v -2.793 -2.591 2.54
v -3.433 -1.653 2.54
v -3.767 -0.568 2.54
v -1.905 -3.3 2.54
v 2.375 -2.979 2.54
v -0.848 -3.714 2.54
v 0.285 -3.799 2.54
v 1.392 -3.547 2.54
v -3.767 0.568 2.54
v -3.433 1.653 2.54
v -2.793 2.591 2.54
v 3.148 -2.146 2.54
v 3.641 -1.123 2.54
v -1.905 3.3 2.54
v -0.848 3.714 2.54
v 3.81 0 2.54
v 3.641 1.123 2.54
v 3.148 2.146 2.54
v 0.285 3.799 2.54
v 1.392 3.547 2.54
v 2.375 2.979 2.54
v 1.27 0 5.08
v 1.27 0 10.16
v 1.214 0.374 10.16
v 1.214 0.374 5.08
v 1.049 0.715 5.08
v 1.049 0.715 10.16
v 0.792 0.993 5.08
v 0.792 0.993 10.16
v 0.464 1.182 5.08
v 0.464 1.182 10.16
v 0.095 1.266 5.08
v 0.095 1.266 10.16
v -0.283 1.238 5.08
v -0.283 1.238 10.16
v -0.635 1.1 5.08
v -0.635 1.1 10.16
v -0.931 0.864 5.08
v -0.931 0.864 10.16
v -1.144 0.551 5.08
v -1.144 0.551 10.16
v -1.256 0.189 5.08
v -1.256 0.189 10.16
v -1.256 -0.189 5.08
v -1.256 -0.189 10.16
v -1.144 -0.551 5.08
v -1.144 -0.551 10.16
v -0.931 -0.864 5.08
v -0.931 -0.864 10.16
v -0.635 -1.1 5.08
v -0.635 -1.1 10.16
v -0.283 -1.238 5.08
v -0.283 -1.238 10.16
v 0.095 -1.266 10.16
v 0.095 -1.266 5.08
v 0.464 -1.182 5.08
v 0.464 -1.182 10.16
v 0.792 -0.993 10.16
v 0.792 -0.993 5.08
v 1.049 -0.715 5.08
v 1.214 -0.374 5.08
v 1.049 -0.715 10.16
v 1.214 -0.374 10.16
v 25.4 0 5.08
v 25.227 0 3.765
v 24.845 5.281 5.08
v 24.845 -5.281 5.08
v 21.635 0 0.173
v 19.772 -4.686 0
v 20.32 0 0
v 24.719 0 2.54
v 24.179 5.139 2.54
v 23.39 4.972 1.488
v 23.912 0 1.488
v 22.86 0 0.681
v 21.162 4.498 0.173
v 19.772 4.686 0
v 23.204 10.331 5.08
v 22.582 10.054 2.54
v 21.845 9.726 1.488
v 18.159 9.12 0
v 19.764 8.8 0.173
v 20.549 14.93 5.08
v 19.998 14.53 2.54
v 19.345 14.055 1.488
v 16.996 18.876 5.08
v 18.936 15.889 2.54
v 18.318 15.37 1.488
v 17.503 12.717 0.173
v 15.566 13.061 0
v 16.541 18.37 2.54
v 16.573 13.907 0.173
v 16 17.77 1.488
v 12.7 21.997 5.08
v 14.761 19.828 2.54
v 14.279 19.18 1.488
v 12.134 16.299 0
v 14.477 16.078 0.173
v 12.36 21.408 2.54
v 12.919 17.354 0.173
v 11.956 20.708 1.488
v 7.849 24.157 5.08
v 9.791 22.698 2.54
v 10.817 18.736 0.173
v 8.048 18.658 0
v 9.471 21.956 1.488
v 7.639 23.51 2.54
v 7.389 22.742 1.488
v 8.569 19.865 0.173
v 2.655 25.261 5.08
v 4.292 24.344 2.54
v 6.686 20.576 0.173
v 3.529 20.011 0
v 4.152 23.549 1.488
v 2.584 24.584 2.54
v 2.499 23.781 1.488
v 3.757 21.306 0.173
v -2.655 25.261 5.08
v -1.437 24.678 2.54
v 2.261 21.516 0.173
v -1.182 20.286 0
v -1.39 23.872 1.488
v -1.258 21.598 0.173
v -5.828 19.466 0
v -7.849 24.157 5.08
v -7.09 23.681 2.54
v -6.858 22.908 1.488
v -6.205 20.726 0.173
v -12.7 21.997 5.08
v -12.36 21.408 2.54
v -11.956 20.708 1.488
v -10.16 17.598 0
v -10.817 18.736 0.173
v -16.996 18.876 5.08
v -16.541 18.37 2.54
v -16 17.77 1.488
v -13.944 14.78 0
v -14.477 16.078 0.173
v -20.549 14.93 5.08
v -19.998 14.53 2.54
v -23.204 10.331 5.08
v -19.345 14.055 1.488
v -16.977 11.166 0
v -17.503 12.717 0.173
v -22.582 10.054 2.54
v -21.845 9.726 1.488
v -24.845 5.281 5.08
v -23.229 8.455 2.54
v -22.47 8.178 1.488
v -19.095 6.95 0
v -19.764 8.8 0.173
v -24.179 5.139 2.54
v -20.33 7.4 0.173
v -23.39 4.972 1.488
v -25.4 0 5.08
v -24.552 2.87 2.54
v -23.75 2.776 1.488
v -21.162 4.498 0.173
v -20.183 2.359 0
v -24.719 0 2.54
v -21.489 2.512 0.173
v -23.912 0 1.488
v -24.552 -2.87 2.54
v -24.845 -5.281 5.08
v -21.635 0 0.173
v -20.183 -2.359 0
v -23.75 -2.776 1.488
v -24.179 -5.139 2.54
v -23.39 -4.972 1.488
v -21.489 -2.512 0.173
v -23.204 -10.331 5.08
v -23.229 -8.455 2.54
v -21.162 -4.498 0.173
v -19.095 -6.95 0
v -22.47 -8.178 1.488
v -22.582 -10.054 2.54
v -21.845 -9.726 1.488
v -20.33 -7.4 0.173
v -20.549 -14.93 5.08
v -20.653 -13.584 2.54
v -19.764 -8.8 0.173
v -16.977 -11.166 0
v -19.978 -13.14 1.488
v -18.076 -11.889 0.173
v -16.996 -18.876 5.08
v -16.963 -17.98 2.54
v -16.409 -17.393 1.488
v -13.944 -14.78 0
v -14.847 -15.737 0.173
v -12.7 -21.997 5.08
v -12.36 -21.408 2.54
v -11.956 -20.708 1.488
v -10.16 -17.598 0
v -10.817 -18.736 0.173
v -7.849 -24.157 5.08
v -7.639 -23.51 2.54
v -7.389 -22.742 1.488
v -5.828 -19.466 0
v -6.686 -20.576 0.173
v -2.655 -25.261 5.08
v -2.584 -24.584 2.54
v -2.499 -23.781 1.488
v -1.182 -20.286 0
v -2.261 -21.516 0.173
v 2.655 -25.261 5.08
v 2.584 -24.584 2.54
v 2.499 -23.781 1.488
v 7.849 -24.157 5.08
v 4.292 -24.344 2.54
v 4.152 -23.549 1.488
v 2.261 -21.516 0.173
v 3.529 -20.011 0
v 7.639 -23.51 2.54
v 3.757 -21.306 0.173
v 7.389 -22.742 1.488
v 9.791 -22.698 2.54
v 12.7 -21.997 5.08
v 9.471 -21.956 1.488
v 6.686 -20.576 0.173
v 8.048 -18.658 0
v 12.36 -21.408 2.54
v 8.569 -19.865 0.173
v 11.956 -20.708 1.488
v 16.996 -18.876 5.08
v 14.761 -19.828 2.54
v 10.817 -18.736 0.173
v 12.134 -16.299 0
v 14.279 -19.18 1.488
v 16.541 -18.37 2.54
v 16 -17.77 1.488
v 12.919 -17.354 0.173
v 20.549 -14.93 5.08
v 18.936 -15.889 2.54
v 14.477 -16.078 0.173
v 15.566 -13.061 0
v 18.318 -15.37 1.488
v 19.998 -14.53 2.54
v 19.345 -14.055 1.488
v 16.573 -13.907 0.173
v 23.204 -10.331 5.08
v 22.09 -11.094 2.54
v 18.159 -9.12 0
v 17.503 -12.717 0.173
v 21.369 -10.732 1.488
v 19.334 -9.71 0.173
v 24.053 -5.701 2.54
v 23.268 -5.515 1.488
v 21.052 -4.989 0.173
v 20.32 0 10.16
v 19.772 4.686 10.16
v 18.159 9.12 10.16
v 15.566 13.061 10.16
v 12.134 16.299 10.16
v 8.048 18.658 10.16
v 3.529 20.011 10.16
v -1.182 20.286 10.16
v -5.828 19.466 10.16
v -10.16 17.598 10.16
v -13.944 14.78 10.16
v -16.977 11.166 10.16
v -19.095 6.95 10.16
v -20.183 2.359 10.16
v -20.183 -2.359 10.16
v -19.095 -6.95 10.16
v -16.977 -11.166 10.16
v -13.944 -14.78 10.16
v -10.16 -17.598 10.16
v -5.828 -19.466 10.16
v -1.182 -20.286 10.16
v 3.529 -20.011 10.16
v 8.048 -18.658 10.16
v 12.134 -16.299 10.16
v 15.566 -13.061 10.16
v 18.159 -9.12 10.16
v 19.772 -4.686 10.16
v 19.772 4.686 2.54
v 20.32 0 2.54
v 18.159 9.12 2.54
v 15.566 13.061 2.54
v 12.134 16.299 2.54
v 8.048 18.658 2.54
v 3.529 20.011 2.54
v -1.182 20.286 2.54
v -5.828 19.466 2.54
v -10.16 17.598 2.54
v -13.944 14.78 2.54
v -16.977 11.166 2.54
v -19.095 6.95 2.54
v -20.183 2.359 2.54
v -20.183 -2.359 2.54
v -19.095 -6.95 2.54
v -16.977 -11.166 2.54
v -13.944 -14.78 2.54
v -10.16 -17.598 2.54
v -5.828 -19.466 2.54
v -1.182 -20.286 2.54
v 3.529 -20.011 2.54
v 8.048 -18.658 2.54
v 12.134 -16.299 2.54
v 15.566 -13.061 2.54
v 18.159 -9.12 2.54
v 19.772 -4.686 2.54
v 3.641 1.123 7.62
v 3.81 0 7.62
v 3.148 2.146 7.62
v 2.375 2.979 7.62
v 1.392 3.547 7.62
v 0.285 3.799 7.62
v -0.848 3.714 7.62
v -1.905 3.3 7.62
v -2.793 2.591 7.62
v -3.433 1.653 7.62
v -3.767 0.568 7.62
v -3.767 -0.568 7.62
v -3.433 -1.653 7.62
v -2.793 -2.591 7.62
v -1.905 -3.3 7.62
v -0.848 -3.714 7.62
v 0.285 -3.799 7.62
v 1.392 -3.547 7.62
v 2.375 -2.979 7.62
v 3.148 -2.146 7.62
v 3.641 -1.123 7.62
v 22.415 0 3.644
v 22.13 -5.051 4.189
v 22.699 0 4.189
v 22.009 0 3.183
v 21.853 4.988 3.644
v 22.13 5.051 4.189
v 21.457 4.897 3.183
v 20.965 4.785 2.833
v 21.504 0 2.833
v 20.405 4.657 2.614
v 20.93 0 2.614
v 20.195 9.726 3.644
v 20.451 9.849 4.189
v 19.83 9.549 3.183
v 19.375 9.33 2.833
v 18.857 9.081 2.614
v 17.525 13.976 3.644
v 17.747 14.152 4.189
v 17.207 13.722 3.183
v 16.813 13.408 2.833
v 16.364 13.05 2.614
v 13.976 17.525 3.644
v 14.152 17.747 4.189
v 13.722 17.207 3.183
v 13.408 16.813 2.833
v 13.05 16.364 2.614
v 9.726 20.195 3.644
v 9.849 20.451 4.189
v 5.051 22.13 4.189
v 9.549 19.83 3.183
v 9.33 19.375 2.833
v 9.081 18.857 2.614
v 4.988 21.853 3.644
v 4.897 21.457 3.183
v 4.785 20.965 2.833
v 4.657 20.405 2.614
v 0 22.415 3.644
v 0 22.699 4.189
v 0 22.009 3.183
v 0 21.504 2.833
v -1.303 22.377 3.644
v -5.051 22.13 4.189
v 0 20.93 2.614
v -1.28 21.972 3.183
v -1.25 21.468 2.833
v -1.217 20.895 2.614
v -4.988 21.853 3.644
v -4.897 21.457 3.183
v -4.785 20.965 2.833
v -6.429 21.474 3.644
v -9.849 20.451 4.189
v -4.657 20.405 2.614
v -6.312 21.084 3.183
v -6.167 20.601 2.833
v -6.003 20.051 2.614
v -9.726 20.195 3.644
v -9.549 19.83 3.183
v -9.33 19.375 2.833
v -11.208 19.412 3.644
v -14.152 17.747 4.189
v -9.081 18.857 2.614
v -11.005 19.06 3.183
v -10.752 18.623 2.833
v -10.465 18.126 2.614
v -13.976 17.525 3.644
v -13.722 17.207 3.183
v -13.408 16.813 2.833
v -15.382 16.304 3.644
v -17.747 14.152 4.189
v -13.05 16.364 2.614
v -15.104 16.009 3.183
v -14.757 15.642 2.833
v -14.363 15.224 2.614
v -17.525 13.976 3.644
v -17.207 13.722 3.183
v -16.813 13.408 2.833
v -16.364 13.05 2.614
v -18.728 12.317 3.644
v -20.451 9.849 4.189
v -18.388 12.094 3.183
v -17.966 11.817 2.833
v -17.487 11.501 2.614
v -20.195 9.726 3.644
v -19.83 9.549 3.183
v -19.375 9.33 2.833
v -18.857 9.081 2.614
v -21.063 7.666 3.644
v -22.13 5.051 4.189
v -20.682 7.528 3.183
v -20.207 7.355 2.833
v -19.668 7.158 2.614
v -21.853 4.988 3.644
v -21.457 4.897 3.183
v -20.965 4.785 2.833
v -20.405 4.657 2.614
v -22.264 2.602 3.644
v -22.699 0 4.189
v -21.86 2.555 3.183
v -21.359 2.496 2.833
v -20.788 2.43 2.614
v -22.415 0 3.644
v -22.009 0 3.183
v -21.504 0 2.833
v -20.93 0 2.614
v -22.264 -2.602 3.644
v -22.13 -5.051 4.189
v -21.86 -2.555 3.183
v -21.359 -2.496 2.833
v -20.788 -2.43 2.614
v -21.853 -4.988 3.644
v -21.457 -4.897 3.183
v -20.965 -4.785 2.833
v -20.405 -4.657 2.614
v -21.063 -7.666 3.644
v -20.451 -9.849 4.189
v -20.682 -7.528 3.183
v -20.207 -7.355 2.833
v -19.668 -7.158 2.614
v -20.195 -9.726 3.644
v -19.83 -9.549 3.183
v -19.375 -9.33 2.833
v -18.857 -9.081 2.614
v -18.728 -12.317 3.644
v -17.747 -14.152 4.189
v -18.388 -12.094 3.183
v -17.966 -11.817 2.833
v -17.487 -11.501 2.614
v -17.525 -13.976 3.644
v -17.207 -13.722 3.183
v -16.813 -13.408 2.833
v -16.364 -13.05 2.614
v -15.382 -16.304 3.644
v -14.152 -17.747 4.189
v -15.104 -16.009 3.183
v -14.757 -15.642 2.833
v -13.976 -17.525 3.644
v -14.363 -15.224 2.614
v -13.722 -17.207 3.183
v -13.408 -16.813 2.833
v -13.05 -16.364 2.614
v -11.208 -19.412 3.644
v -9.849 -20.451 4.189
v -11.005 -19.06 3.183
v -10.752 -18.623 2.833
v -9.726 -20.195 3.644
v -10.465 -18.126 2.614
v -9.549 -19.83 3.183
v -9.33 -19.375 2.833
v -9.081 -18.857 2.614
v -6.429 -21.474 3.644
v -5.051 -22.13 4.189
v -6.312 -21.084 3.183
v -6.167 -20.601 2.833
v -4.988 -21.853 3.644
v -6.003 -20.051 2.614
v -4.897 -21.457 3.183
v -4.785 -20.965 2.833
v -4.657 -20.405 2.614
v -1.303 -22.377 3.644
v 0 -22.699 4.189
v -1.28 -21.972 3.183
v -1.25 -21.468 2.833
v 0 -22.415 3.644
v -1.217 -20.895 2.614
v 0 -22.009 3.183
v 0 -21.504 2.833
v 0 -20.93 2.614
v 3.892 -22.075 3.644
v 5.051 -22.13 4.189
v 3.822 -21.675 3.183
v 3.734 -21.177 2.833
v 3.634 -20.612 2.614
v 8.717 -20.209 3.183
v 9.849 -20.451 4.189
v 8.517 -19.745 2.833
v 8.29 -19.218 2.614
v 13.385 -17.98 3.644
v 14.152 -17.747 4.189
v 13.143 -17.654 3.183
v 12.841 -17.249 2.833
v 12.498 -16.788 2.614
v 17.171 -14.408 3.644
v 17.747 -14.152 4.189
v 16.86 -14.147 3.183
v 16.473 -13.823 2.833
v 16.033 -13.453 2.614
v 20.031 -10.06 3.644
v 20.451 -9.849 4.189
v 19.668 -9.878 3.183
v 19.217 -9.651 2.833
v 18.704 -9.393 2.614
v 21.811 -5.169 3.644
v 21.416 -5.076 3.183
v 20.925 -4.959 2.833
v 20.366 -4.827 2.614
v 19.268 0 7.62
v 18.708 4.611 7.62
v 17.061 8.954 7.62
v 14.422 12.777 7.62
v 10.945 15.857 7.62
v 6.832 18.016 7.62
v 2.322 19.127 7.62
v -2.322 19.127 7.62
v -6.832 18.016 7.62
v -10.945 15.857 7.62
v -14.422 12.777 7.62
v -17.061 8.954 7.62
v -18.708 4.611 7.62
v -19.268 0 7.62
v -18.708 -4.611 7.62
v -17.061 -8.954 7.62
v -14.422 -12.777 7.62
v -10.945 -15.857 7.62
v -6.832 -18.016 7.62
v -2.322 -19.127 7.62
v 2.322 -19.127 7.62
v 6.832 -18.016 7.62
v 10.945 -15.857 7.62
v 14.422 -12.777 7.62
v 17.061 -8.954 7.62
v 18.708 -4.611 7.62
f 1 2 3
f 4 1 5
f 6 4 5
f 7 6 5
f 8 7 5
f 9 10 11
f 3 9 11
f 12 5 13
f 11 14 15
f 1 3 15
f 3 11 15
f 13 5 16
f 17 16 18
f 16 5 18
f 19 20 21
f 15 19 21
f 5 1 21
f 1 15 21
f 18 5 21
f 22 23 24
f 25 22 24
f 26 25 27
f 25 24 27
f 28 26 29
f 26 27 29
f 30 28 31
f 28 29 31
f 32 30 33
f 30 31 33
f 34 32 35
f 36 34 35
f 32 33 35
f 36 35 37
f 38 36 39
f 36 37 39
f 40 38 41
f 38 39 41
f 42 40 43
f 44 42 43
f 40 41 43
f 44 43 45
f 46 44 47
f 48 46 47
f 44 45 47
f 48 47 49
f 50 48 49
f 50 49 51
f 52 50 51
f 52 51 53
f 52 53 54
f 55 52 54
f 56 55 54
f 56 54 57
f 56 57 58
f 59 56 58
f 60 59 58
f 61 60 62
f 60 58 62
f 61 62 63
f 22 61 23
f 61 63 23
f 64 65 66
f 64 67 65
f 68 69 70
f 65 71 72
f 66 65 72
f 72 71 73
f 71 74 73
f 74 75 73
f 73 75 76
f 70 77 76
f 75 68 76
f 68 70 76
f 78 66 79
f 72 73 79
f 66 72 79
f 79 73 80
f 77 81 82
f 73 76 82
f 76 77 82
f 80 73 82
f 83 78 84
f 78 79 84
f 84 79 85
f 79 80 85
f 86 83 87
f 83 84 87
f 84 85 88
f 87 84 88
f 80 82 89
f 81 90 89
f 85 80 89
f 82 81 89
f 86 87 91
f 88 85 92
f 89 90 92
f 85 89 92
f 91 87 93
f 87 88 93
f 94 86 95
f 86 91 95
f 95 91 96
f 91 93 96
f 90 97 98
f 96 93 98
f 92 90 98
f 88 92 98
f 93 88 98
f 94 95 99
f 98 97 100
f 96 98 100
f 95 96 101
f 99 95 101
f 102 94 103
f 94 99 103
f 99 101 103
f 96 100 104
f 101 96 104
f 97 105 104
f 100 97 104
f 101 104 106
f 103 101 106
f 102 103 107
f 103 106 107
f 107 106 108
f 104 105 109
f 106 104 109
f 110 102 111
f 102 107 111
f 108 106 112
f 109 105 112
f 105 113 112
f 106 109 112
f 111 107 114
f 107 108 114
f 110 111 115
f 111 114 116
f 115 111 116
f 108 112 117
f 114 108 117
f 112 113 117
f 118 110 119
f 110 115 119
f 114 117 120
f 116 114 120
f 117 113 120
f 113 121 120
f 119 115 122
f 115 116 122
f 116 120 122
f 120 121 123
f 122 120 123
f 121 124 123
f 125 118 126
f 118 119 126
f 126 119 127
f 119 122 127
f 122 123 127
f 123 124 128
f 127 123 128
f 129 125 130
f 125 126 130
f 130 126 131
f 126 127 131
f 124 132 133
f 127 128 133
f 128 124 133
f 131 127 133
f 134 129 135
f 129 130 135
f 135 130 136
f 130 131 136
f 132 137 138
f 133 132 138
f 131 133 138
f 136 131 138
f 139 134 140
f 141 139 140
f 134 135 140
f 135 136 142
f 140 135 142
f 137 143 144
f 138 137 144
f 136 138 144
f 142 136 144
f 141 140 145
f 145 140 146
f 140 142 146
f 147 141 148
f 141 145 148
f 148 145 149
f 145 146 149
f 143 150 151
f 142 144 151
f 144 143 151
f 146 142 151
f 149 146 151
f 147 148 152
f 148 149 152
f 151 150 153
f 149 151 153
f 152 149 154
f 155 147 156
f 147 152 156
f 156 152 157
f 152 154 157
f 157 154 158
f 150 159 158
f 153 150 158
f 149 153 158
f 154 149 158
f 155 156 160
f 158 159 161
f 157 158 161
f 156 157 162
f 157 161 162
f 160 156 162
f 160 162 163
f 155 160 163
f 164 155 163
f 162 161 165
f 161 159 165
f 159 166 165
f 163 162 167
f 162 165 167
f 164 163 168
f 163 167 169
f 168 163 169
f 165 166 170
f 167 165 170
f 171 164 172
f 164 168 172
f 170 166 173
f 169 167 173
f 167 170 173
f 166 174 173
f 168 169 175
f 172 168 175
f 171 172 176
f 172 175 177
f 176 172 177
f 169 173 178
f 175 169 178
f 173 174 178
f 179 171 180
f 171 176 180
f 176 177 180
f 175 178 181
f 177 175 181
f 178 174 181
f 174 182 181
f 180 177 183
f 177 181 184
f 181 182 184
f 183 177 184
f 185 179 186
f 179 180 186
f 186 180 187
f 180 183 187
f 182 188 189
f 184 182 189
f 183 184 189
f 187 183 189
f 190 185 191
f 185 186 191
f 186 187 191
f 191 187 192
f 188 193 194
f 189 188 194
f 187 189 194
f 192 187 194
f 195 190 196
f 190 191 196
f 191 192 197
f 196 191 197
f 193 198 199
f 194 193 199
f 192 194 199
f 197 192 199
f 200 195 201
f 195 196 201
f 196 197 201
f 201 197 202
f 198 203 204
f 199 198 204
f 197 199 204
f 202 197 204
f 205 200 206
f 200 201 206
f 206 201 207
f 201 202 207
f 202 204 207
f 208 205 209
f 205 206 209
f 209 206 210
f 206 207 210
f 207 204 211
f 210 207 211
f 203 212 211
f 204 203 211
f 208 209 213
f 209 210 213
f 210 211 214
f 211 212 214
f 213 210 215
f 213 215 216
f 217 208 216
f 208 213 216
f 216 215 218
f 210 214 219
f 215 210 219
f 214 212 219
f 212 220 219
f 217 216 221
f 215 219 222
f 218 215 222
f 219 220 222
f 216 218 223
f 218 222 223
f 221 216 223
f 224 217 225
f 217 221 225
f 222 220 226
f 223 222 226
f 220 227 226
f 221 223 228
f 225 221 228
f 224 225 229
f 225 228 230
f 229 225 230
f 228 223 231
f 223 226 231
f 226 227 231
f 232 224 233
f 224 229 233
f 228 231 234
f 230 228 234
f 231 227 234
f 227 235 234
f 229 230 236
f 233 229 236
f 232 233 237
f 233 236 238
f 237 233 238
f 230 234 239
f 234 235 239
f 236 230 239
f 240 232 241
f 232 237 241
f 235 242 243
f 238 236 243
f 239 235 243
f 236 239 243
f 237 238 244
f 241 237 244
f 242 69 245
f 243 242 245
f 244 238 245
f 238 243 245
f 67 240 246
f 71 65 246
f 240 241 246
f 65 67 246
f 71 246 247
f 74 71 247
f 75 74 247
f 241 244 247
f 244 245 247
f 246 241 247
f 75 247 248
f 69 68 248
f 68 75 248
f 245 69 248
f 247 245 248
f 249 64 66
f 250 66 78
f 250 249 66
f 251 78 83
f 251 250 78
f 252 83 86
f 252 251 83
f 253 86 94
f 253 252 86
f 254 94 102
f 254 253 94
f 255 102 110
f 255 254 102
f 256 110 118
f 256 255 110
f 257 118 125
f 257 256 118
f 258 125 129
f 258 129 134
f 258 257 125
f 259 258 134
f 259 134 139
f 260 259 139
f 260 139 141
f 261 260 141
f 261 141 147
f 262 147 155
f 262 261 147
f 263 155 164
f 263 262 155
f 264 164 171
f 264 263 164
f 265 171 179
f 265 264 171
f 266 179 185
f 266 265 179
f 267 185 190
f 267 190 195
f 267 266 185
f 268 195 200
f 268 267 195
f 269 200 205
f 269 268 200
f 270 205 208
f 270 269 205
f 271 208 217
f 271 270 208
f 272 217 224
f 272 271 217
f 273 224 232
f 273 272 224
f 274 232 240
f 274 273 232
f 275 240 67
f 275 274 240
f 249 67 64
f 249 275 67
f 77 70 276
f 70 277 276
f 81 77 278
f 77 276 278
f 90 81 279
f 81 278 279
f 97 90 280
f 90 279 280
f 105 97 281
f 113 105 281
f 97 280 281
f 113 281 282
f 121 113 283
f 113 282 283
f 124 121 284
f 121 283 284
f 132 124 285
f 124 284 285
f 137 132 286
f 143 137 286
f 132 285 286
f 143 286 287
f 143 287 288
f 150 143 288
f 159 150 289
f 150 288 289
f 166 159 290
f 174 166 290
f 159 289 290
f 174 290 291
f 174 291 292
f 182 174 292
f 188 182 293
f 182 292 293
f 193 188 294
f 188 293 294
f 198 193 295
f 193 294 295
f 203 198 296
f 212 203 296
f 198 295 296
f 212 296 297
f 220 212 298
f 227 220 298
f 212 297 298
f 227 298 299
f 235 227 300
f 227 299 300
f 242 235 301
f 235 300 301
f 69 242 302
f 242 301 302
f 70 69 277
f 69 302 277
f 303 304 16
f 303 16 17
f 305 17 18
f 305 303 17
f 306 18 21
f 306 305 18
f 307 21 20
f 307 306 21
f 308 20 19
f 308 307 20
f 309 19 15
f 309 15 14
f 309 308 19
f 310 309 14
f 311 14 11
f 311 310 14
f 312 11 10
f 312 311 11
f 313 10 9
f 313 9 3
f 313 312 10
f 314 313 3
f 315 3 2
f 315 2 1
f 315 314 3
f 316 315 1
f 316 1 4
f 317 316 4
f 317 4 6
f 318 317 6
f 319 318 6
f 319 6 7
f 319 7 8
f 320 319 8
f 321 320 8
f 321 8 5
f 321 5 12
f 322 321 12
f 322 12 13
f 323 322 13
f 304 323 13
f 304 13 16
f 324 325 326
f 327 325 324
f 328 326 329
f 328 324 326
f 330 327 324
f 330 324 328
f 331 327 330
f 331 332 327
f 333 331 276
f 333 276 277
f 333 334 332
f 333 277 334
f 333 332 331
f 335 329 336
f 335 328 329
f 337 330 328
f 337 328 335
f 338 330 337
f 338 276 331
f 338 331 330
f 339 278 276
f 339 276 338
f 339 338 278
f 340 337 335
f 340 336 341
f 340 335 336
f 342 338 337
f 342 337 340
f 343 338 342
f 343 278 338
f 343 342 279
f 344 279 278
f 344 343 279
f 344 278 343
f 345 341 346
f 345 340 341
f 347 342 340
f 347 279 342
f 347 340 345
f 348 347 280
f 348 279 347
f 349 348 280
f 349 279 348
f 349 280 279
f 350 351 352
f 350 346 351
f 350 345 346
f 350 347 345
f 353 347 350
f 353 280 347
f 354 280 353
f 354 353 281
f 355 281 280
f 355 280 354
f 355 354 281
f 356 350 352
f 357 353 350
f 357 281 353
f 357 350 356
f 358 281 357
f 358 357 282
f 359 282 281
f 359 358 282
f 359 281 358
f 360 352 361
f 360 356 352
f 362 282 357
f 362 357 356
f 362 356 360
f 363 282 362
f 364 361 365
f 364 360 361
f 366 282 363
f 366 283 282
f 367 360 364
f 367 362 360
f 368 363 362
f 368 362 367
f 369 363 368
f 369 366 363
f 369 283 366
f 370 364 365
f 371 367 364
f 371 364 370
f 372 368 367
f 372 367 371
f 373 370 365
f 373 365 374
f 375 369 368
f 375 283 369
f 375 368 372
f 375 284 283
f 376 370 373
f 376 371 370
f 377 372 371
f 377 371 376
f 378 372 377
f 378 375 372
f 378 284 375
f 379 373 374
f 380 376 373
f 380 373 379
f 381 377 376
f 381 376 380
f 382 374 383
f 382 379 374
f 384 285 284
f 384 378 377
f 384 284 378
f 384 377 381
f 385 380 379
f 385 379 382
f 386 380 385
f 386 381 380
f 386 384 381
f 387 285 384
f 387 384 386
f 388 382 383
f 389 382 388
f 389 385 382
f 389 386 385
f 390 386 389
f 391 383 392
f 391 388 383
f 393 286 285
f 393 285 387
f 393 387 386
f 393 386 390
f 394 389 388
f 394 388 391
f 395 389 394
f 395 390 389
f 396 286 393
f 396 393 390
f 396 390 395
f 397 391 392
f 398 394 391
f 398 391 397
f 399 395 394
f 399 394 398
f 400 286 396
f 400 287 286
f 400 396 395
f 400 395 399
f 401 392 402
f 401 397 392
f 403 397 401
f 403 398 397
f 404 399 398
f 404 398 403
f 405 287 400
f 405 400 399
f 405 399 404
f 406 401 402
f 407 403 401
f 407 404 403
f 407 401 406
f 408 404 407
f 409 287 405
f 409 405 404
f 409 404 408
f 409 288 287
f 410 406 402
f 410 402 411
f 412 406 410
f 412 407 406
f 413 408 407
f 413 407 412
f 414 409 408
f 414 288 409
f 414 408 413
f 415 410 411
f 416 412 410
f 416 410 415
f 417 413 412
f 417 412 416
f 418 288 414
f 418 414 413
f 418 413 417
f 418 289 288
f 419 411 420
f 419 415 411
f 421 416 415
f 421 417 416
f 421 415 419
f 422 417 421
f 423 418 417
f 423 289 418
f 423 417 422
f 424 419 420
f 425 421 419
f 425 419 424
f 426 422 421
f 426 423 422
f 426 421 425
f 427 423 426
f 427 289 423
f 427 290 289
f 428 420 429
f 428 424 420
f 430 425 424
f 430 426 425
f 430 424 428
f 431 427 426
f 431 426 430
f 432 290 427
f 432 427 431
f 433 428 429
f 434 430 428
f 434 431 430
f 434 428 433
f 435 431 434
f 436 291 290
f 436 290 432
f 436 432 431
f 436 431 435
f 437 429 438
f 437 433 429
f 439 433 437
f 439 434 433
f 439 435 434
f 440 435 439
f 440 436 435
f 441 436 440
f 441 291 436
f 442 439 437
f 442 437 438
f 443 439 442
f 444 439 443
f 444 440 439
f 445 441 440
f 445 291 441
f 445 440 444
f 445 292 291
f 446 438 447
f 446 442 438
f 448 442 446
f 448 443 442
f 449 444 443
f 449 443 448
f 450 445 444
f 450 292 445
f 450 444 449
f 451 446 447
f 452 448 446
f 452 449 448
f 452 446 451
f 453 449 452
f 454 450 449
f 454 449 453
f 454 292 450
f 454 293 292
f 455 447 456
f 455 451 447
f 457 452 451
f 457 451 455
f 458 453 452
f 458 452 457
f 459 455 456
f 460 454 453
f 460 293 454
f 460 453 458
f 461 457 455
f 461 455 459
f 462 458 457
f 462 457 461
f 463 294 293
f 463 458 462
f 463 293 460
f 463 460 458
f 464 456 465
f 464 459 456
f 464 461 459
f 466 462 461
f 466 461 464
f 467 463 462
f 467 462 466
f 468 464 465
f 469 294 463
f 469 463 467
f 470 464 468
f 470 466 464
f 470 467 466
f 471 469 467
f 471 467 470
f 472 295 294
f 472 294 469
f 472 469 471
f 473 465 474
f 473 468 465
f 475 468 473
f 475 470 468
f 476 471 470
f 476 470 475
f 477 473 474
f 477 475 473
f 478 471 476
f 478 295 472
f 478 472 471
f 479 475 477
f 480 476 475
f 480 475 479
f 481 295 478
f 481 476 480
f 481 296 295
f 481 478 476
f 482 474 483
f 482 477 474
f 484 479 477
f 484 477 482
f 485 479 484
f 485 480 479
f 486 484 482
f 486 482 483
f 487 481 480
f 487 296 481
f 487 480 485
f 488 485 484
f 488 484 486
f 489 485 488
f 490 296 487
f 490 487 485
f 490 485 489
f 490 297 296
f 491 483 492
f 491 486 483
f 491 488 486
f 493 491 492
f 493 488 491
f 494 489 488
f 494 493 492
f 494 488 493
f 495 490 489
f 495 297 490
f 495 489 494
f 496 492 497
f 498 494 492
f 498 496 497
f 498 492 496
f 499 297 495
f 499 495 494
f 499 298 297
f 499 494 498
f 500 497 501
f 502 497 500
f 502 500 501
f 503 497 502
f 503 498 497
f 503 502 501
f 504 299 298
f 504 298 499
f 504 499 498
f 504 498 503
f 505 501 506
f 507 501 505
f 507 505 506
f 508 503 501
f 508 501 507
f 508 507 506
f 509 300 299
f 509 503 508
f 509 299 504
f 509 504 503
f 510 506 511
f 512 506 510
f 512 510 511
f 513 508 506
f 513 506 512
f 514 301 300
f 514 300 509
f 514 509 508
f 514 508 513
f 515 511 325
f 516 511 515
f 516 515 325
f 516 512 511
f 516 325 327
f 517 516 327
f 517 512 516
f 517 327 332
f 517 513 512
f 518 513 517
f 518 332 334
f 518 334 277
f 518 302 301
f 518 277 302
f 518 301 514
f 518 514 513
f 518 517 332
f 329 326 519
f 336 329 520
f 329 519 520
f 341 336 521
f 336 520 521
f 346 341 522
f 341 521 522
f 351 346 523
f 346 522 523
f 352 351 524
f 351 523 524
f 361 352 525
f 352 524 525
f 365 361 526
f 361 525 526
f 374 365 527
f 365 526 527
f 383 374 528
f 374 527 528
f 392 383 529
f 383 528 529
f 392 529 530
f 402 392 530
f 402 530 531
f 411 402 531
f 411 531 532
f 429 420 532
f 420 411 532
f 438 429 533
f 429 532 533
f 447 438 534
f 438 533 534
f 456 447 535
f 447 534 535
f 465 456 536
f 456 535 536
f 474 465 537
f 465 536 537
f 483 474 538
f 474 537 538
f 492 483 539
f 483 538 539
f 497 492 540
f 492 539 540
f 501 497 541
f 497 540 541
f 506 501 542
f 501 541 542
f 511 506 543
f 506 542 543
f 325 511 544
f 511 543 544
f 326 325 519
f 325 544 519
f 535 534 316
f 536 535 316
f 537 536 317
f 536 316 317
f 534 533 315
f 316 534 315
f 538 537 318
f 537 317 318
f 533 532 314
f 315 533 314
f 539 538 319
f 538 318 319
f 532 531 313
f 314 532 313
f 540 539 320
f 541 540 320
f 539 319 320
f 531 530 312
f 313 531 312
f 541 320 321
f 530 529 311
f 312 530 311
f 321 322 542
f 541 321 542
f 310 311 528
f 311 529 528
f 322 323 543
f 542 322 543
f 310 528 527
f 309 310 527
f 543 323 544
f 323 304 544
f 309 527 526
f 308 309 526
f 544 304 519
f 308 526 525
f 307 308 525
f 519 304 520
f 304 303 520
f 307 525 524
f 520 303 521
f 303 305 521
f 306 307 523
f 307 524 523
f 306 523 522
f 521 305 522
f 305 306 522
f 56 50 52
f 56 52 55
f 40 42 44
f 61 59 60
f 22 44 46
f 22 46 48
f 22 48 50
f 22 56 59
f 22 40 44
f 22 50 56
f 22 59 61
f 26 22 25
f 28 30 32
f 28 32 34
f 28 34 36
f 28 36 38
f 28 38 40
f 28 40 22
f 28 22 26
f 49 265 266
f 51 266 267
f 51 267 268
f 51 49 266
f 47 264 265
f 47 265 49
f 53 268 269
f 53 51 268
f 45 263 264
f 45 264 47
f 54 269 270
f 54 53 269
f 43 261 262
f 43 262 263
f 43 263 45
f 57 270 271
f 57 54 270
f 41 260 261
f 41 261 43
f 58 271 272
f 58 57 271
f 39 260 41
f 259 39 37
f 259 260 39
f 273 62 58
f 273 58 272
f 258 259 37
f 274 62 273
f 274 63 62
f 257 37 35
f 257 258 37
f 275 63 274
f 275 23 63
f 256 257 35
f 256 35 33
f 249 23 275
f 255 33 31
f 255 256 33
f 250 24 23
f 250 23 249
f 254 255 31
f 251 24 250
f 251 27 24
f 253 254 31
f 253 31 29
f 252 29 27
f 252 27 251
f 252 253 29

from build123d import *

# Parameters (mm, degrees)
F0_R     = 25.4
F1_DEPTH = 10.16
F2_R     = 1.27
F3_DEPTH = 5.08
F4_SIZE  = 5.08
F5_R     = 5.07999
F6_T     = 2.54


# Not quite as in the source:
# - a fillet or chamfer is up to 0.001 mm smaller than in the source, because OpenCascade refuses the exact size
# - a shell that OpenCascade refuses in one call is made with other operations: the cavity is built on its own and cut out


with BuildPart() as f1:
    # F0 (on Top) → F1 (new body)
    with BuildSketch(Plane.XY):
        Circle(F0_R)
    extrude(amount=F1_DEPTH)

    # F2 (on face) → F3 (cut)
    with BuildSketch(Plane.XY.offset(10.16)):
        Circle(F2_R)
    extrude(amount=-F3_DEPTH, mode=Mode.SUBTRACT)

    # F4
    f4_edges = [f1.edges().sort_by_distance(p)[0] for p in [
        (-25.4, 0, 10.16),
    ]]
    chamfer(f4_edges, length=F4_SIZE)

    # F5 (radius 5.08 in the source; OpenCascade refuses exactly that, so slightly less here)
    f5_edges = [f1.edges().sort_by_distance(p)[0] for p in [
        (-25.4, 0, 0),
    ]]
    fillet(f5_edges, radius=F5_R)

    # F6: shell of thickness 2.54, made by hand


with BuildPart() as f6_core1:
    # F6_t2: copy of F1
    add(f1.part)

    # the walls: a layer under each face that stays
    f6_faces = [f6_core1.faces().sort_by_distance(p)[0] for p in [
        (-25.4, 0, 5.079995),
        (-23.9121053774, 0, 1.4878946226),
        (-22.86, 0, 7.62),
        (-13.5466666667, -13.5466666667, 10.16),
        (-1.27, 0, 7.62),
        (0, 0, 5.08),
    ]]
    thicken(f6_faces, amount=-F6_T, mode=Mode.SUBTRACT)

    # F6_s3 → F6_t4 (revolve, cut)
    with BuildSketch(Plane.XZ):
        Polygon((1.2446, 5.1054), (3.81, 5.08), (3.81, 2.54), (1.27, 2.54), align=None)
    revolve(axis=Axis((0, 0, 5.08), (0, 0, 1)), mode=Mode.SUBTRACT)


with BuildPart() as f1_1:
    add(f1.part)

    # what is left inside the walls is the cavity
    f6_cavity = [f6_core1.part.solids().sort_by_distance(p)[0] for p in [
        (0, -6.773337, 0.0254),
    ]]
    add(f6_cavity, mode=Mode.SUBTRACT)


solid = f1_1.part
